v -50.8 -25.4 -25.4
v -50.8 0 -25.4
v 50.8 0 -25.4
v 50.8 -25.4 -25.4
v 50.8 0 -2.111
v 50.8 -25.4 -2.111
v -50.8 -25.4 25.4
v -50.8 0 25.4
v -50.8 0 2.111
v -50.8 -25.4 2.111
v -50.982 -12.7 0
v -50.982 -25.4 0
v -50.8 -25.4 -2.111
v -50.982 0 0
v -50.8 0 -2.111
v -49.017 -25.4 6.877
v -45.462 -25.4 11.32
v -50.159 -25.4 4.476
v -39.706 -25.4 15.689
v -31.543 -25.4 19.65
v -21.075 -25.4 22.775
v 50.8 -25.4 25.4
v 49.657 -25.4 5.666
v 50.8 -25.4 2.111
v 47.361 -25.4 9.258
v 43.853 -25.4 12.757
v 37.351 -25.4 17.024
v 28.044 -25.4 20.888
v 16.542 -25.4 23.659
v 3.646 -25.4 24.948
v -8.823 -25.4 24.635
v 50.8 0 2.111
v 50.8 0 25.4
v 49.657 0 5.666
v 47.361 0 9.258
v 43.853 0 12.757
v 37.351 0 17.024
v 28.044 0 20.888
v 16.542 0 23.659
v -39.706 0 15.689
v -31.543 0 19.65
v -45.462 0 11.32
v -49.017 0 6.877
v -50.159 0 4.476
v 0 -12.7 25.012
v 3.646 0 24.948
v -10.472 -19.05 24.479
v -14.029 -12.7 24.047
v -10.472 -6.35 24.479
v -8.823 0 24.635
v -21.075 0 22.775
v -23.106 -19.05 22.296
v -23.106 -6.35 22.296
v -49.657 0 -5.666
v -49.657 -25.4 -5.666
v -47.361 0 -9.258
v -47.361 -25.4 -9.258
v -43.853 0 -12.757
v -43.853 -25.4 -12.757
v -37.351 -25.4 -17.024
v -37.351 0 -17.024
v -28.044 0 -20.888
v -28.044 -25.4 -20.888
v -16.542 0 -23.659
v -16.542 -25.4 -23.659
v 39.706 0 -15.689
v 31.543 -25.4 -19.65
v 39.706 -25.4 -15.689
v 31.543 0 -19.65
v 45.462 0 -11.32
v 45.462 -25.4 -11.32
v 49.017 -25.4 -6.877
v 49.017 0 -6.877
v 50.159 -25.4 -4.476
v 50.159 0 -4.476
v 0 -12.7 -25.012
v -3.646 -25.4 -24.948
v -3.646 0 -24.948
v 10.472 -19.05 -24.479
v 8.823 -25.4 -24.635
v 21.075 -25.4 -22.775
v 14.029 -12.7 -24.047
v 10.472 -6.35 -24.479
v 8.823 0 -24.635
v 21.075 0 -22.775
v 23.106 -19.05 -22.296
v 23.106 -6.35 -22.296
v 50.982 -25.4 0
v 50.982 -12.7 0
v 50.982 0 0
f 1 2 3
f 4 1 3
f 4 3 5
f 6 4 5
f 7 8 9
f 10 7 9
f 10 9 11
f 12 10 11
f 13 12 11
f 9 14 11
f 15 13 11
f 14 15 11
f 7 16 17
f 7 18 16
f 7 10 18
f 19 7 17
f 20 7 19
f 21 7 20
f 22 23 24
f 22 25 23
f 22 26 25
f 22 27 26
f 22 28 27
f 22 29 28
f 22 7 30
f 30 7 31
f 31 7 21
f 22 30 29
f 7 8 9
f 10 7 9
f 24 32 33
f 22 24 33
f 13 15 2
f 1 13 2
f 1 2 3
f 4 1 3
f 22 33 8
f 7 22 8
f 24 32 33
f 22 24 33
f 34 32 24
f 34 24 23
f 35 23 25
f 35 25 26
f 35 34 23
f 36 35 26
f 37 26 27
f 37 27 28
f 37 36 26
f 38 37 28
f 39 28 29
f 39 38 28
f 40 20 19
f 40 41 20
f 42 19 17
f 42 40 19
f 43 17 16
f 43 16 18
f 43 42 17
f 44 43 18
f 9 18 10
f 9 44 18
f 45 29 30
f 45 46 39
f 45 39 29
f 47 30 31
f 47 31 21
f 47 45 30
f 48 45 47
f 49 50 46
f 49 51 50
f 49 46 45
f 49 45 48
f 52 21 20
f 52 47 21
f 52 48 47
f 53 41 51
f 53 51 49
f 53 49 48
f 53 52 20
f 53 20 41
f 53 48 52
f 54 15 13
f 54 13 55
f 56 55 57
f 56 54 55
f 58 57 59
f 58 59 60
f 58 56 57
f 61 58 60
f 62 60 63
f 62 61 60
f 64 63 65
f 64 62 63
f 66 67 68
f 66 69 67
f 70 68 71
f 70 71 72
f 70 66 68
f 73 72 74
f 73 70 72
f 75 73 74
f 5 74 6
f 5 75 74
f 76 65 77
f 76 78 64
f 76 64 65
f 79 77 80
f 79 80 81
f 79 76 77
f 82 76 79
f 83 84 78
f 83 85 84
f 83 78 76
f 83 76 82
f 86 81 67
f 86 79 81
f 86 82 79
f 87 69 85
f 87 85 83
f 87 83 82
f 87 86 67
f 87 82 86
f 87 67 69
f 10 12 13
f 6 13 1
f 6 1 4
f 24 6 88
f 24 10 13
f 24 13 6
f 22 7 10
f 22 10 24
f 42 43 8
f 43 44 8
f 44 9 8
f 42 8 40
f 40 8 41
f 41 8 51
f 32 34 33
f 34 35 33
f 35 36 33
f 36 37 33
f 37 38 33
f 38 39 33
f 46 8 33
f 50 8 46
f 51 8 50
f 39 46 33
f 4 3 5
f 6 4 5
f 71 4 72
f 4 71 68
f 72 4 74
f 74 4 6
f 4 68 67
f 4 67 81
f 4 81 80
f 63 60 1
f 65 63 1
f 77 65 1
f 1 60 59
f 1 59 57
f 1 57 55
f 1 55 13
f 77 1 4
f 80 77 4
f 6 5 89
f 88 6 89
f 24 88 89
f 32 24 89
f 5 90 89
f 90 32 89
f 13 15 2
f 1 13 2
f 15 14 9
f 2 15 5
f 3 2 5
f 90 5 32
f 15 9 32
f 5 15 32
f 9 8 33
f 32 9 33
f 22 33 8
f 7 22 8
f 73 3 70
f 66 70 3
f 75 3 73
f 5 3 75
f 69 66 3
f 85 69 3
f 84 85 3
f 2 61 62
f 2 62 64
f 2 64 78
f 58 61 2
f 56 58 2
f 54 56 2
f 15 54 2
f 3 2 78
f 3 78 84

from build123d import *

# Parameters (mm, degrees)
F1_DEPTH = 25.4
F2_DEPTH = 25.4


with BuildPart() as f1:
    # F0 (on Front) → F1 (new body)
    with BuildSketch(Plane.XZ):
        with BuildLine():
            Line((50.8, 25.4), (-50.8, 25.4))
            Line((-50.8, 25.4), (-50.8, 2.111028816))
            add(Edge.make_bspline(
                [(50.8, 2.111028816), (46.8462238092, 25.0124750638), (0, 25.0124750638), (-46.8462238092, 25.0124750638), (-50.8, 2.111028816)],
                knots=[3.2260922119, 3.2260922119, 3.2260922119, 4.7123889804, 4.7123889804, 6.1986857488, 6.1986857488, 6.1986857488], degree=2, weights=[1, 0.7363419848, 1, 0.7363419848, 1]))
            Line((50.8, 2.111028816), (50.8, 25.4))
        make_face()
    extrude(amount=F1_DEPTH)


with BuildPart() as f1b:
    # F0 (on Front) → F1, piece 2 (new body)
    with BuildSketch(Plane.XZ):
        with BuildLine():
            add(Edge.make_bspline(
                [(-50.8, -2.111028816), (-46.8462238092, -25.0124750638), (0, -25.0124750638), (46.8462238092, -25.0124750638), (50.8, -2.111028816)],
                knots=[0.0844995584, 0.0844995584, 0.0844995584, 1.5707963268, 1.5707963268, 3.0570930952, 3.0570930952, 3.0570930952], degree=2, weights=[1, 0.7363419848, 1, 0.7363419848, 1]))
            Line((-50.8, -2.111028816), (-50.8, -25.4))
            Line((-50.8, -25.4), (50.8, -25.4))
            Line((50.8, -25.4), (50.8, -2.111028816))
        make_face()
    extrude(amount=F1_DEPTH)


with BuildPart() as f2:
    # F0 (on Front) → F2 (new body)
    with BuildSketch(Plane.XZ):
        with BuildLine():
            Line((50.8, 25.4), (-50.8, 25.4))
            Line((-50.8, 25.4), (-50.8, 2.111028816))
            add(Edge.make_bspline(
                [(50.8, 2.111028816), (46.8462238092, 25.0124750638), (0, 25.0124750638), (-46.8462238092, 25.0124750638), (-50.8, 2.111028816)],
                knots=[3.2260922119, 3.2260922119, 3.2260922119, 4.7123889804, 4.7123889804, 6.1986857488, 6.1986857488, 6.1986857488], degree=2, weights=[1, 0.7363419848, 1, 0.7363419848, 1]))
            Line((50.8, 2.111028816), (50.8, 25.4))
        make_face()
        with BuildLine():
            add(Edge.make_bspline(
                [(50.8, 2.111028816), (46.8462238092, 25.0124750638), (0, 25.0124750638), (-46.8462238092, 25.0124750638), (-50.8, 2.111028816)],
                knots=[3.2260922119, 3.2260922119, 3.2260922119, 4.7123889804, 4.7123889804, 6.1986857488, 6.1986857488, 6.1986857488], degree=2, weights=[1, 0.7363419848, 1, 0.7363419848, 1]))
            Line((-50.8, 2.111028816), (-50.8, -2.111028816))
            add(Edge.make_bspline(
                [(-50.8, -2.111028816), (-46.8462238092, -25.0124750638), (0, -25.0124750638), (46.8462238092, -25.0124750638), (50.8, -2.111028816)],
                knots=[0.0844995584, 0.0844995584, 0.0844995584, 1.5707963268, 1.5707963268, 3.0570930952, 3.0570930952, 3.0570930952], degree=2, weights=[1, 0.7363419848, 1, 0.7363419848, 1]))
            Line((50.8, -2.111028816), (50.8, 2.111028816))
        make_face()
        with BuildLine():
            Line((-50.8, -2.111028816), (-50.8, 2.111028816))
            add(Edge.make_bspline(
                [(-50.8, 2.111028816), (-50.9819015861, 1.0574007919), (-50.9819015861, 0)],
                knots=[6.1986857488, 6.1986857488, 6.1986857488, 6.2831853072, 6.2831853072, 6.2831853072], degree=2, weights=[1, 0.9991076108, 1]))
            add(Edge.make_bspline(
                [(-50.9819015861, 0), (-50.9819015861, -1.0574007919), (-50.8, -2.111028816)],
                knots=[0, 0, 0, 0.0844995584, 0.0844995584, 0.0844995584], degree=2, weights=[1, 0.9991076108, 1]))
        make_face()
        with BuildLine():
            add(Edge.make_bspline(
                [(50.8, -2.111028816), (51.1644545144, 0), (50.8, 2.111028816)],
                knots=[3.0570930952, 3.0570930952, 3.0570930952, 3.2260922119, 3.2260922119, 3.2260922119], degree=2, weights=[1, 0.9964320361, 1]))
            Line((50.8, 2.111028816), (50.8, -2.111028816))
        make_face()
        with BuildLine():
            add(Edge.make_bspline(
                [(-50.8, -2.111028816), (-46.8462238092, -25.0124750638), (0, -25.0124750638), (46.8462238092, -25.0124750638), (50.8, -2.111028816)],
                knots=[0.0844995584, 0.0844995584, 0.0844995584, 1.5707963268, 1.5707963268, 3.0570930952, 3.0570930952, 3.0570930952], degree=2, weights=[1, 0.7363419848, 1, 0.7363419848, 1]))
            Line((-50.8, -2.111028816), (-50.8, -25.4))
            Line((-50.8, -25.4), (50.8, -25.4))
            Line((50.8, -25.4), (50.8, -2.111028816))
        make_face()
    extrude(amount=F2_DEPTH)


solid = Compound([f1.part, f1b.part, f2.part])
